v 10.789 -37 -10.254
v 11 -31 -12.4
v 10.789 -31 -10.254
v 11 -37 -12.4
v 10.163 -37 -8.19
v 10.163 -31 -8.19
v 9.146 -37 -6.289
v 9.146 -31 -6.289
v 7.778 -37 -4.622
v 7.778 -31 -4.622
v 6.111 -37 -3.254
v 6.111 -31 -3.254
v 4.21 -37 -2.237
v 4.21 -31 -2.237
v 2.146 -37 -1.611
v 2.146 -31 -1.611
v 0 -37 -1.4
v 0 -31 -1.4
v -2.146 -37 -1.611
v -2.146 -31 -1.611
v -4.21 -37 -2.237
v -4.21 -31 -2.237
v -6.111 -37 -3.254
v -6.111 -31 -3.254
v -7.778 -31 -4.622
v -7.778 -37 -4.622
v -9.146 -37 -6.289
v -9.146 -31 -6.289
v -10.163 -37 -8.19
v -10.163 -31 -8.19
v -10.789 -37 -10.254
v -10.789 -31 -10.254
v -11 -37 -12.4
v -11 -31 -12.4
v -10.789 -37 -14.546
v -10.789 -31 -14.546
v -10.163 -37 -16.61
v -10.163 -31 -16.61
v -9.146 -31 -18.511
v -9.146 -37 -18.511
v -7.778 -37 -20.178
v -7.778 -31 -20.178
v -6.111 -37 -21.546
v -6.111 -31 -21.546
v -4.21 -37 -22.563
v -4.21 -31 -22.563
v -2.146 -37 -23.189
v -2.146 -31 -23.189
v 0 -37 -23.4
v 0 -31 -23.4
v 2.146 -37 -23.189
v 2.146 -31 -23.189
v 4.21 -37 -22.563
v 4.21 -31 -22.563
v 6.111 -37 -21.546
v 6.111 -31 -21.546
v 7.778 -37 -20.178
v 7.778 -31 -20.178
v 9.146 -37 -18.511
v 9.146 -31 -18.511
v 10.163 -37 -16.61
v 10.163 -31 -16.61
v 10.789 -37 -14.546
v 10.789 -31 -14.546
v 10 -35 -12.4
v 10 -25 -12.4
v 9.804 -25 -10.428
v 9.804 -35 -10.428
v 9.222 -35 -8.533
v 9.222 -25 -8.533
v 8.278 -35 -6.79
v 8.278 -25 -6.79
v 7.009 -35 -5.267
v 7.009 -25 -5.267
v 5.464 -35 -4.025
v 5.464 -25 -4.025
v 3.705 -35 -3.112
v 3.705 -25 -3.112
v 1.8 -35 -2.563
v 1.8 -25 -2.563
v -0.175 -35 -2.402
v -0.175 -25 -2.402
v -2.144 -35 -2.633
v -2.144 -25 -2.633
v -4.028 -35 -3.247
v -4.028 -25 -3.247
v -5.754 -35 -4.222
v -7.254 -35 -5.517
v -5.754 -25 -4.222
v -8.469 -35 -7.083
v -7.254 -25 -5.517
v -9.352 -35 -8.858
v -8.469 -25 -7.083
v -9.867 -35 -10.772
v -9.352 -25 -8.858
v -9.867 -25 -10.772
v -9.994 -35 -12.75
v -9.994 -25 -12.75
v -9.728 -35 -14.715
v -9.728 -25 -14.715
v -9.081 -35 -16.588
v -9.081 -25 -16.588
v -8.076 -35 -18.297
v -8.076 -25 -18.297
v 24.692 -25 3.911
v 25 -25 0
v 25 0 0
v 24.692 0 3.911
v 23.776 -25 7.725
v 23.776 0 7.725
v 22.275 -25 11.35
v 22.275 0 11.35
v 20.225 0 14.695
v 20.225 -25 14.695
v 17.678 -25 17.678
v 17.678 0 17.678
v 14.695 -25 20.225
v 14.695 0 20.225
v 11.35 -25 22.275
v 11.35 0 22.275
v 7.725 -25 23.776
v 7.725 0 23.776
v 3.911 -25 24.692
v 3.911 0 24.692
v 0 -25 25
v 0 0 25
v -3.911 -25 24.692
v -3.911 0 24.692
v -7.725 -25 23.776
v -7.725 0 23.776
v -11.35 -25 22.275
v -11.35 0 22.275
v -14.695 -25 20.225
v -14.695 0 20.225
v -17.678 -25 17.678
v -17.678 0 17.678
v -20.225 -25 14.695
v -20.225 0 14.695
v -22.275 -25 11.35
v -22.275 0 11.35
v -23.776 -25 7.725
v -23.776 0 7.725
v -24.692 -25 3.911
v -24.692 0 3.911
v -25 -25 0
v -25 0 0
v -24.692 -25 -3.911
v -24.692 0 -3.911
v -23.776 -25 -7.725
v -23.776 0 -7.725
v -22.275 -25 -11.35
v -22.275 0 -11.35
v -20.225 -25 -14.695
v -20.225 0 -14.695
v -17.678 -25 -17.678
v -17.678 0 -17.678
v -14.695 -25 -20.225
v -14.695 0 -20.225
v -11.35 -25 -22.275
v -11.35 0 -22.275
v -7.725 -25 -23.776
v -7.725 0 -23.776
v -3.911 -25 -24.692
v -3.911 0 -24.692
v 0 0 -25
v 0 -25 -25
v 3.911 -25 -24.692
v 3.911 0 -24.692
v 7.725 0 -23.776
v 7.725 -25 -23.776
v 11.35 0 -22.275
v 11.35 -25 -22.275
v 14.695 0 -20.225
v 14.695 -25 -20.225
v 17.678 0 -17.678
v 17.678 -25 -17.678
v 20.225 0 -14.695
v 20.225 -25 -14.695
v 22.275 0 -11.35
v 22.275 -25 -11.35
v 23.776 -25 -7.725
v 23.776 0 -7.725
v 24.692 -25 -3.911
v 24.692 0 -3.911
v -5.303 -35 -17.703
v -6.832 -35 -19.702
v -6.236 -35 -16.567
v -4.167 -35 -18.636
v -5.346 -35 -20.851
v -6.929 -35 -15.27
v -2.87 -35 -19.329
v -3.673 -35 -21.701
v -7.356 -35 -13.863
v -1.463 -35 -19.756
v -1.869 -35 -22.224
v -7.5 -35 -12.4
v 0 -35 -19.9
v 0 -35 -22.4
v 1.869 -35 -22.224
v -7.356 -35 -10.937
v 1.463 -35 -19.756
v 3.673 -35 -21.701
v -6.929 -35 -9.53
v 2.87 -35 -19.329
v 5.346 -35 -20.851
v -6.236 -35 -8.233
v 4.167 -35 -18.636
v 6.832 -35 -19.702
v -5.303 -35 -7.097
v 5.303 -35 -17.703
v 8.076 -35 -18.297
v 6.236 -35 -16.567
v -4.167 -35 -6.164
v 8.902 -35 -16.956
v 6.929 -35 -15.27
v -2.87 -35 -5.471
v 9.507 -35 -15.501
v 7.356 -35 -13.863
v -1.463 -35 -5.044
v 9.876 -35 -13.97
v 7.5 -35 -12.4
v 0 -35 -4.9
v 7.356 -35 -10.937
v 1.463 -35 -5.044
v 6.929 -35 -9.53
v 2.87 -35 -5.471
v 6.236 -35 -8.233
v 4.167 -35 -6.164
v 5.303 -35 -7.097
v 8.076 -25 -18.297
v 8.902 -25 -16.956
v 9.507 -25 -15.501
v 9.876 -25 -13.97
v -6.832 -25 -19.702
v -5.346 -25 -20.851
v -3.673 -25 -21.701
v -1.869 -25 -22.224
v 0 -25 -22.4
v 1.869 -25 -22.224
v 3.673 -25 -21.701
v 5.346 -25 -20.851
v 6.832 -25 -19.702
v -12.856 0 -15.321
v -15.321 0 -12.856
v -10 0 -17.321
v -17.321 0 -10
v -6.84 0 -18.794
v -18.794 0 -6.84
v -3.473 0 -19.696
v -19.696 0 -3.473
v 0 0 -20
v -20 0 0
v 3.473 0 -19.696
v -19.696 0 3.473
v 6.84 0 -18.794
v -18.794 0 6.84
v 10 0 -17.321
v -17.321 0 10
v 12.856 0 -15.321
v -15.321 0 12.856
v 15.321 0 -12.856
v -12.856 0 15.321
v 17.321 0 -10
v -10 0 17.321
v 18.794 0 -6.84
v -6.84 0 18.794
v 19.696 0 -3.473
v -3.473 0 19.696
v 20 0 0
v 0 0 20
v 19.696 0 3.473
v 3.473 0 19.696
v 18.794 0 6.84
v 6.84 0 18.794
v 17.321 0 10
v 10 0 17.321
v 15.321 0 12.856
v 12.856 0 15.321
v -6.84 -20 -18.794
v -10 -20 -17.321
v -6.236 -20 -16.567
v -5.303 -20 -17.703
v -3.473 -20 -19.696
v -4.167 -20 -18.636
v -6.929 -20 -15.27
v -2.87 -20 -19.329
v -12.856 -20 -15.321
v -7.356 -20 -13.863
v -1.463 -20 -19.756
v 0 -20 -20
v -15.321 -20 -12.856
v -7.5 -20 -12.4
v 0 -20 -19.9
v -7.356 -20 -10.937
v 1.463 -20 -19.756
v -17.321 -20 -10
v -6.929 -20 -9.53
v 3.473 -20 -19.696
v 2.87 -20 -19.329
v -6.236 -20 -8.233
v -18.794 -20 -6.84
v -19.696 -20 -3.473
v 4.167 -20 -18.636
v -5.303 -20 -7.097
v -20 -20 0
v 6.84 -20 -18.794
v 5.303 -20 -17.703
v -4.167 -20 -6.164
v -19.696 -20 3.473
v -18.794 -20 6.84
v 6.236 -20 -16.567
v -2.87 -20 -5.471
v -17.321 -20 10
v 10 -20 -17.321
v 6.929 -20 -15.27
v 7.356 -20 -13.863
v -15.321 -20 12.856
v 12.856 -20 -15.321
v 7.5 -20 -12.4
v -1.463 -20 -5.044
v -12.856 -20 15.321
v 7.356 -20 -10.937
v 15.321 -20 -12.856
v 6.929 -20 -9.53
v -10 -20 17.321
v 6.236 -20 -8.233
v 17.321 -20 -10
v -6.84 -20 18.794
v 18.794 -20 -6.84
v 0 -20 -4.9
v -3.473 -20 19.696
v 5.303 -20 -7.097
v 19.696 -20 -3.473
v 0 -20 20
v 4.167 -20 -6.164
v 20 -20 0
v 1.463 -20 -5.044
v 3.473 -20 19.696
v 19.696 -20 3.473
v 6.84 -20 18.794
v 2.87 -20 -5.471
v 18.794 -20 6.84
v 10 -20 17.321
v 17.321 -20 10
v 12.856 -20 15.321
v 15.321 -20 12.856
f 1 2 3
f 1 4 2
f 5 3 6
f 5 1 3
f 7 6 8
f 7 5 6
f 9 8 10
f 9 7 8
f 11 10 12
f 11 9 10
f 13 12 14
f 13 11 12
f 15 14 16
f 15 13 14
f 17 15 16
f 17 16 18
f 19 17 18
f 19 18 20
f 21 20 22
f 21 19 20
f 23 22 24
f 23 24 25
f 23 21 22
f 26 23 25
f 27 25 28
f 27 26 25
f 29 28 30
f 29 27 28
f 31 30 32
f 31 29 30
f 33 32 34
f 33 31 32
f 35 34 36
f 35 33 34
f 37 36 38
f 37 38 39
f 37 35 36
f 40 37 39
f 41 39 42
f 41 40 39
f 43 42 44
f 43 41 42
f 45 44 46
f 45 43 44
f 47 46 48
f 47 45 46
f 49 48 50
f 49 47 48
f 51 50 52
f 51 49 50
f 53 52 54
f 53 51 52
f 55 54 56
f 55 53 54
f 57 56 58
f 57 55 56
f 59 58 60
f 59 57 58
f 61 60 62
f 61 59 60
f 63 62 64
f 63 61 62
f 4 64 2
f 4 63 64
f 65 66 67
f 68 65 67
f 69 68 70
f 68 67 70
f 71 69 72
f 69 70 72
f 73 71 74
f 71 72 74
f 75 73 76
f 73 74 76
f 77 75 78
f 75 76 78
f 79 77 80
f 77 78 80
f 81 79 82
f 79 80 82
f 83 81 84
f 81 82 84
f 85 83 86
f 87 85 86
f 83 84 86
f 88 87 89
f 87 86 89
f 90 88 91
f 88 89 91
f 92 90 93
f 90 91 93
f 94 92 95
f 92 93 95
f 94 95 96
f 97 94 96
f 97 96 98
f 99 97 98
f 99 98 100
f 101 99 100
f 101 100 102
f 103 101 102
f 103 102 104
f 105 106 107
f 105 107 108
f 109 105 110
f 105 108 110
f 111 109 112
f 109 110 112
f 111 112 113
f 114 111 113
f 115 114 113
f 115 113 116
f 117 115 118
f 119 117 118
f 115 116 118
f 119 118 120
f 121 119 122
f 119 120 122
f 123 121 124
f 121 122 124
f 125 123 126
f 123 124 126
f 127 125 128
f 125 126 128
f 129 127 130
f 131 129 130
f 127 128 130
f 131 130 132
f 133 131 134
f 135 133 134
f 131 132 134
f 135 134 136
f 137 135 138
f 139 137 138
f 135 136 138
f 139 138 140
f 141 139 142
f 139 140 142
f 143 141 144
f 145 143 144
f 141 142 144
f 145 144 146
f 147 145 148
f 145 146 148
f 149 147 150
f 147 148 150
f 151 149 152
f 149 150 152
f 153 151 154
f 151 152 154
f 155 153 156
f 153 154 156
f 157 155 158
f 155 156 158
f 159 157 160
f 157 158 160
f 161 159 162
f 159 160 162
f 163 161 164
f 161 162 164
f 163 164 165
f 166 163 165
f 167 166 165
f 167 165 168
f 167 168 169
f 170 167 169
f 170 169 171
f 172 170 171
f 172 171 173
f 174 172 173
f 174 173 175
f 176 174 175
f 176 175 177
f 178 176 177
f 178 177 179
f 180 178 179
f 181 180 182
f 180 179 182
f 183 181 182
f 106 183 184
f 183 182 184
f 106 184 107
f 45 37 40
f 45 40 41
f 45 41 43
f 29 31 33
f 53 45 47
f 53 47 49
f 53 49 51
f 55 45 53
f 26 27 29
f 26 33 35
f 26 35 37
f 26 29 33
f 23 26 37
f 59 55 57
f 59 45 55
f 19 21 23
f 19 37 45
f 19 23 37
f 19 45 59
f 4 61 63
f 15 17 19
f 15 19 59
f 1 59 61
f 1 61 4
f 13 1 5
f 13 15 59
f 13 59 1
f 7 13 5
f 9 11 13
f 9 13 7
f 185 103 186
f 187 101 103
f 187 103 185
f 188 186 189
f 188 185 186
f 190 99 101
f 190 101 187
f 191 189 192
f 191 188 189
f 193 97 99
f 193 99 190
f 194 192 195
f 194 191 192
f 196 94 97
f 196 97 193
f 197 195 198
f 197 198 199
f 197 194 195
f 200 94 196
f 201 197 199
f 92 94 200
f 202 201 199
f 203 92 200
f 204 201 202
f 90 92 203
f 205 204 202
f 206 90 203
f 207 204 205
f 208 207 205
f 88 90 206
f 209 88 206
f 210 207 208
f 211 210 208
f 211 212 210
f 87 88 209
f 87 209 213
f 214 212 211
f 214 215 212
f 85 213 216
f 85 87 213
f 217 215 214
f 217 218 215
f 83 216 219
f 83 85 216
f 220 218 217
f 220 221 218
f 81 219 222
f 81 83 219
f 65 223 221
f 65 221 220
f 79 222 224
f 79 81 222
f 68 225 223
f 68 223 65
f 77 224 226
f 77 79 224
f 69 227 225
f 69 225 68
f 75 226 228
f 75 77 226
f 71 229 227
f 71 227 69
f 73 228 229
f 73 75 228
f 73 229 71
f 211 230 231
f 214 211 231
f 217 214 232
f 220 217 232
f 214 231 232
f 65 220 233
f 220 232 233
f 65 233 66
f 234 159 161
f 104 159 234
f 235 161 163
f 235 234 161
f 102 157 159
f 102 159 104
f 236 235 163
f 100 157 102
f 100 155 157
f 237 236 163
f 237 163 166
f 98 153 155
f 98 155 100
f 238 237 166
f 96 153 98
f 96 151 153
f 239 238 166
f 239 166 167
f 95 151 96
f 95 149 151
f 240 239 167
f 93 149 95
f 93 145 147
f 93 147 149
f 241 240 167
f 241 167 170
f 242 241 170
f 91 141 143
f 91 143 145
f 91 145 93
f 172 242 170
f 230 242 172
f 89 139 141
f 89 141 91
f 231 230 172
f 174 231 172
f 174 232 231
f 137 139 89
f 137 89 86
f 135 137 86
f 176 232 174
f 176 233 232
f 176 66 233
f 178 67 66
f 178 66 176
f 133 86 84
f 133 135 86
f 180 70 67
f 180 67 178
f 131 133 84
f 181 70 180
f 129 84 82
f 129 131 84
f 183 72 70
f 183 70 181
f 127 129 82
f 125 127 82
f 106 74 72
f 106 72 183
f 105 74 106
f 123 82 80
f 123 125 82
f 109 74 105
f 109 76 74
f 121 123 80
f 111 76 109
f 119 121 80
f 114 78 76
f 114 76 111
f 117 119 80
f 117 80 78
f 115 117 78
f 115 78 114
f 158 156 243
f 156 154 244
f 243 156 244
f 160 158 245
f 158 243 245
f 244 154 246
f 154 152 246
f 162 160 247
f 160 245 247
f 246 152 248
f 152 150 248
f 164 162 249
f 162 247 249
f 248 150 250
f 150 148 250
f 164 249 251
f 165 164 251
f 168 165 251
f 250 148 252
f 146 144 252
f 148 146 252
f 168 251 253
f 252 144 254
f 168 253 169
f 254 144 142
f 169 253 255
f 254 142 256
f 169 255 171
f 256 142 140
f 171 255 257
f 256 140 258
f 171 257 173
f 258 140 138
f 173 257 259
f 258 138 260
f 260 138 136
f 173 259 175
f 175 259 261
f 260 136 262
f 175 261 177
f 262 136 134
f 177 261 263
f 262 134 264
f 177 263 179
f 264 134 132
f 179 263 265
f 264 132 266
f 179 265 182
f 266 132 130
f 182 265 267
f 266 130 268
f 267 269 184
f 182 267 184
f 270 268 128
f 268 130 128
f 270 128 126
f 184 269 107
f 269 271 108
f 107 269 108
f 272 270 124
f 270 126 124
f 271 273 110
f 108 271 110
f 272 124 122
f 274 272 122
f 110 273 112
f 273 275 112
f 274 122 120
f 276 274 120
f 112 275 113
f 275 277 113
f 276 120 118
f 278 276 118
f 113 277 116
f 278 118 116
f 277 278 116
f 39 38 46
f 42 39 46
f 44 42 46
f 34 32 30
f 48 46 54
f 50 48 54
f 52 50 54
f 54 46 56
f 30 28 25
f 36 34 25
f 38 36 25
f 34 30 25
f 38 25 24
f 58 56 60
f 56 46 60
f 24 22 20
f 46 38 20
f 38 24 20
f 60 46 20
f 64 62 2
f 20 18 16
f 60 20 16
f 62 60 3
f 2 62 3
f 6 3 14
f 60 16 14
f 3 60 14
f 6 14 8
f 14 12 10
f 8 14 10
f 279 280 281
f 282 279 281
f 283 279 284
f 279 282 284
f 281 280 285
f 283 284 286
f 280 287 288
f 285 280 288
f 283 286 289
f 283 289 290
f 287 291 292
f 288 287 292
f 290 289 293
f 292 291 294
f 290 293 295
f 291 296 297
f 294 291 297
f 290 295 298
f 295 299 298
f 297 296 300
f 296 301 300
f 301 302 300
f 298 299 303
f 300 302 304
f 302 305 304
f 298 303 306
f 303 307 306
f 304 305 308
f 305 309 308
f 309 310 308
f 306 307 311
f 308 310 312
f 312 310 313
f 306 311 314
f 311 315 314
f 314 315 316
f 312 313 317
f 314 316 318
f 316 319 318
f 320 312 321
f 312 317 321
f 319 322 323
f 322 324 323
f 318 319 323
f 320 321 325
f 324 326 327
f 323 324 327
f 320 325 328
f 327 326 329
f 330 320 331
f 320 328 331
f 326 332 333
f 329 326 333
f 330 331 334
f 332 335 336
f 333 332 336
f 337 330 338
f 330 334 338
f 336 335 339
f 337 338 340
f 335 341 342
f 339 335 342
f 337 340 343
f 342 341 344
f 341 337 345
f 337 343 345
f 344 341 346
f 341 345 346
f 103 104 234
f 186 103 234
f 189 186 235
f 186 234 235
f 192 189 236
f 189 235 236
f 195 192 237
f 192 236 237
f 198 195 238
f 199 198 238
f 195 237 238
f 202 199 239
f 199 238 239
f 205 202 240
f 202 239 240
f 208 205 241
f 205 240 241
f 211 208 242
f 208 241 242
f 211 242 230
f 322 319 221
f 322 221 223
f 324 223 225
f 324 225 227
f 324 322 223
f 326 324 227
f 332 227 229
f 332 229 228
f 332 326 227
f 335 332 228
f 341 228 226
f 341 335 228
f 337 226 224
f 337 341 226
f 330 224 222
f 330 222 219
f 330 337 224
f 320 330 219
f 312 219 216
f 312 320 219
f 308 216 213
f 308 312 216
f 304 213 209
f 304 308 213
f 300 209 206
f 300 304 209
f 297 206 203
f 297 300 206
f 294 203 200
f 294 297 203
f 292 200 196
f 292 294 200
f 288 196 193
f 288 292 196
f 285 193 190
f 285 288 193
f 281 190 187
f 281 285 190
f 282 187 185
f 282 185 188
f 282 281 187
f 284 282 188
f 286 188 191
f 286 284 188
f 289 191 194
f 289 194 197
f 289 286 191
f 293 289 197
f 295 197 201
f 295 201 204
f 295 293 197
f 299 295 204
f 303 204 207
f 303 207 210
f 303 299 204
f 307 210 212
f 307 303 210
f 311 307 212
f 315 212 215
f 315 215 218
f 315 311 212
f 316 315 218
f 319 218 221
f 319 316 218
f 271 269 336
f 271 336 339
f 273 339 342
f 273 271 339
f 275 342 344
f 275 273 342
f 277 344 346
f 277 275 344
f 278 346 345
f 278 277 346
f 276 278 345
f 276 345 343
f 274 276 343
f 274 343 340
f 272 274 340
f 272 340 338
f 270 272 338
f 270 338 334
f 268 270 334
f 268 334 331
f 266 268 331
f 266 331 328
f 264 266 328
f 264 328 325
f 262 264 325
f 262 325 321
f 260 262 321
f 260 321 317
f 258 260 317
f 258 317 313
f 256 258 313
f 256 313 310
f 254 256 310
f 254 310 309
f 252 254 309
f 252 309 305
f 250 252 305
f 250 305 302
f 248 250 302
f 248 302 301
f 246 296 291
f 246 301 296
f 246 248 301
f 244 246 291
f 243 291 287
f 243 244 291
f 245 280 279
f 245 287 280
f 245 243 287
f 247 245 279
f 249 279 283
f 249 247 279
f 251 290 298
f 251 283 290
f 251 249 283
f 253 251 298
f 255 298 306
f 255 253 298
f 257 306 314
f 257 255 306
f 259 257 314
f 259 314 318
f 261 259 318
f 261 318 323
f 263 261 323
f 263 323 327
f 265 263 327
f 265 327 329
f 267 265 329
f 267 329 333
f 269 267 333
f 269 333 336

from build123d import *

# Parameters (mm, degrees)
F0_R     = 25
F0_R_2   = 20
F1_DEPTH = 20
F2_R     = 25
F2_R_2   = 10
F3_DEPTH = 5
F2_R_3   = 7.5
F4_DEPTH = 15
F5_R     = 11
F5_R_2   = 10
F5_R_3   = 7.5
F6_DEPTH = 2
F7_DEPTH = 4


with BuildPart() as f1:
    # F0 (on Front) → F1 (new body)
    with BuildSketch(Plane.XZ):
        Circle(F0_R)
        Circle(F0_R_2, mode=Mode.SUBTRACT)
    extrude(amount=F1_DEPTH)

    # F2 (on face) → F3 (join)
    with BuildSketch(Plane.XZ.offset(20)):
        Circle(F2_R)
        with Locations((0, -12.3999994248)):
            Circle(F2_R_2, mode=Mode.SUBTRACT)
    extrude(amount=F3_DEPTH)

    # F2 (on face) → F4 (join)
    with BuildSketch(Plane.XZ.offset(20)):
        with BuildLine():
            ThreePointArc((8.0763880603, -18.2967744671), (9.5069416902, -15.5012991037), (10, -12.3999994248))
            ThreePointArc((10, -12.3999994248), (-3.1012996789, -2.8930577346), (-8.0763880603, -18.2967744671))
            ThreePointArc((-8.0763880603, -18.2967744671), (0, -20), (8.0763880603, -18.2967744671))
        make_face()
        with Locations((0, -12.3999994248)):
            Circle(F2_R_3, mode=Mode.SUBTRACT)
        with BuildLine():
            ThreePointArc((8.0763880603, -18.2967744671), (0, -20), (-8.0763880603, -18.2967744671))
            ThreePointArc((-8.0763880603, -18.2967744671), (0, -22.3999994248), (8.0763880603, -18.2967744671))
        make_face()
    extrude(amount=F4_DEPTH)


with BuildPart() as f6:
    # F5 (on face) → F6 (new body)
    with BuildSketch(Plane.XZ.offset(35)):
        with Locations((0, -12.3999994248)):
            Circle(F5_R)
        with Locations((0, -12.3999994248)):
            Circle(F5_R_2, mode=Mode.SUBTRACT)
        with Locations((0, -12.3999994248)):
            Circle(F5_R_2)
        with Locations((0, -12.3999994248)):
            Circle(F5_R_3, mode=Mode.SUBTRACT)
        with Locations((0, -12.3999994248)):
            Circle(F5_R_3)
    extrude(amount=F6_DEPTH)

    # F7 (add): a face of the model
    f7_faces = [f6.faces().sort_by_distance(p)[0] for p in [
        (0, -35, -12.3999994248),
    ]]
    extrude(f7_faces, amount=F7_DEPTH)


solid = Compound([f1.part, f6.part])
